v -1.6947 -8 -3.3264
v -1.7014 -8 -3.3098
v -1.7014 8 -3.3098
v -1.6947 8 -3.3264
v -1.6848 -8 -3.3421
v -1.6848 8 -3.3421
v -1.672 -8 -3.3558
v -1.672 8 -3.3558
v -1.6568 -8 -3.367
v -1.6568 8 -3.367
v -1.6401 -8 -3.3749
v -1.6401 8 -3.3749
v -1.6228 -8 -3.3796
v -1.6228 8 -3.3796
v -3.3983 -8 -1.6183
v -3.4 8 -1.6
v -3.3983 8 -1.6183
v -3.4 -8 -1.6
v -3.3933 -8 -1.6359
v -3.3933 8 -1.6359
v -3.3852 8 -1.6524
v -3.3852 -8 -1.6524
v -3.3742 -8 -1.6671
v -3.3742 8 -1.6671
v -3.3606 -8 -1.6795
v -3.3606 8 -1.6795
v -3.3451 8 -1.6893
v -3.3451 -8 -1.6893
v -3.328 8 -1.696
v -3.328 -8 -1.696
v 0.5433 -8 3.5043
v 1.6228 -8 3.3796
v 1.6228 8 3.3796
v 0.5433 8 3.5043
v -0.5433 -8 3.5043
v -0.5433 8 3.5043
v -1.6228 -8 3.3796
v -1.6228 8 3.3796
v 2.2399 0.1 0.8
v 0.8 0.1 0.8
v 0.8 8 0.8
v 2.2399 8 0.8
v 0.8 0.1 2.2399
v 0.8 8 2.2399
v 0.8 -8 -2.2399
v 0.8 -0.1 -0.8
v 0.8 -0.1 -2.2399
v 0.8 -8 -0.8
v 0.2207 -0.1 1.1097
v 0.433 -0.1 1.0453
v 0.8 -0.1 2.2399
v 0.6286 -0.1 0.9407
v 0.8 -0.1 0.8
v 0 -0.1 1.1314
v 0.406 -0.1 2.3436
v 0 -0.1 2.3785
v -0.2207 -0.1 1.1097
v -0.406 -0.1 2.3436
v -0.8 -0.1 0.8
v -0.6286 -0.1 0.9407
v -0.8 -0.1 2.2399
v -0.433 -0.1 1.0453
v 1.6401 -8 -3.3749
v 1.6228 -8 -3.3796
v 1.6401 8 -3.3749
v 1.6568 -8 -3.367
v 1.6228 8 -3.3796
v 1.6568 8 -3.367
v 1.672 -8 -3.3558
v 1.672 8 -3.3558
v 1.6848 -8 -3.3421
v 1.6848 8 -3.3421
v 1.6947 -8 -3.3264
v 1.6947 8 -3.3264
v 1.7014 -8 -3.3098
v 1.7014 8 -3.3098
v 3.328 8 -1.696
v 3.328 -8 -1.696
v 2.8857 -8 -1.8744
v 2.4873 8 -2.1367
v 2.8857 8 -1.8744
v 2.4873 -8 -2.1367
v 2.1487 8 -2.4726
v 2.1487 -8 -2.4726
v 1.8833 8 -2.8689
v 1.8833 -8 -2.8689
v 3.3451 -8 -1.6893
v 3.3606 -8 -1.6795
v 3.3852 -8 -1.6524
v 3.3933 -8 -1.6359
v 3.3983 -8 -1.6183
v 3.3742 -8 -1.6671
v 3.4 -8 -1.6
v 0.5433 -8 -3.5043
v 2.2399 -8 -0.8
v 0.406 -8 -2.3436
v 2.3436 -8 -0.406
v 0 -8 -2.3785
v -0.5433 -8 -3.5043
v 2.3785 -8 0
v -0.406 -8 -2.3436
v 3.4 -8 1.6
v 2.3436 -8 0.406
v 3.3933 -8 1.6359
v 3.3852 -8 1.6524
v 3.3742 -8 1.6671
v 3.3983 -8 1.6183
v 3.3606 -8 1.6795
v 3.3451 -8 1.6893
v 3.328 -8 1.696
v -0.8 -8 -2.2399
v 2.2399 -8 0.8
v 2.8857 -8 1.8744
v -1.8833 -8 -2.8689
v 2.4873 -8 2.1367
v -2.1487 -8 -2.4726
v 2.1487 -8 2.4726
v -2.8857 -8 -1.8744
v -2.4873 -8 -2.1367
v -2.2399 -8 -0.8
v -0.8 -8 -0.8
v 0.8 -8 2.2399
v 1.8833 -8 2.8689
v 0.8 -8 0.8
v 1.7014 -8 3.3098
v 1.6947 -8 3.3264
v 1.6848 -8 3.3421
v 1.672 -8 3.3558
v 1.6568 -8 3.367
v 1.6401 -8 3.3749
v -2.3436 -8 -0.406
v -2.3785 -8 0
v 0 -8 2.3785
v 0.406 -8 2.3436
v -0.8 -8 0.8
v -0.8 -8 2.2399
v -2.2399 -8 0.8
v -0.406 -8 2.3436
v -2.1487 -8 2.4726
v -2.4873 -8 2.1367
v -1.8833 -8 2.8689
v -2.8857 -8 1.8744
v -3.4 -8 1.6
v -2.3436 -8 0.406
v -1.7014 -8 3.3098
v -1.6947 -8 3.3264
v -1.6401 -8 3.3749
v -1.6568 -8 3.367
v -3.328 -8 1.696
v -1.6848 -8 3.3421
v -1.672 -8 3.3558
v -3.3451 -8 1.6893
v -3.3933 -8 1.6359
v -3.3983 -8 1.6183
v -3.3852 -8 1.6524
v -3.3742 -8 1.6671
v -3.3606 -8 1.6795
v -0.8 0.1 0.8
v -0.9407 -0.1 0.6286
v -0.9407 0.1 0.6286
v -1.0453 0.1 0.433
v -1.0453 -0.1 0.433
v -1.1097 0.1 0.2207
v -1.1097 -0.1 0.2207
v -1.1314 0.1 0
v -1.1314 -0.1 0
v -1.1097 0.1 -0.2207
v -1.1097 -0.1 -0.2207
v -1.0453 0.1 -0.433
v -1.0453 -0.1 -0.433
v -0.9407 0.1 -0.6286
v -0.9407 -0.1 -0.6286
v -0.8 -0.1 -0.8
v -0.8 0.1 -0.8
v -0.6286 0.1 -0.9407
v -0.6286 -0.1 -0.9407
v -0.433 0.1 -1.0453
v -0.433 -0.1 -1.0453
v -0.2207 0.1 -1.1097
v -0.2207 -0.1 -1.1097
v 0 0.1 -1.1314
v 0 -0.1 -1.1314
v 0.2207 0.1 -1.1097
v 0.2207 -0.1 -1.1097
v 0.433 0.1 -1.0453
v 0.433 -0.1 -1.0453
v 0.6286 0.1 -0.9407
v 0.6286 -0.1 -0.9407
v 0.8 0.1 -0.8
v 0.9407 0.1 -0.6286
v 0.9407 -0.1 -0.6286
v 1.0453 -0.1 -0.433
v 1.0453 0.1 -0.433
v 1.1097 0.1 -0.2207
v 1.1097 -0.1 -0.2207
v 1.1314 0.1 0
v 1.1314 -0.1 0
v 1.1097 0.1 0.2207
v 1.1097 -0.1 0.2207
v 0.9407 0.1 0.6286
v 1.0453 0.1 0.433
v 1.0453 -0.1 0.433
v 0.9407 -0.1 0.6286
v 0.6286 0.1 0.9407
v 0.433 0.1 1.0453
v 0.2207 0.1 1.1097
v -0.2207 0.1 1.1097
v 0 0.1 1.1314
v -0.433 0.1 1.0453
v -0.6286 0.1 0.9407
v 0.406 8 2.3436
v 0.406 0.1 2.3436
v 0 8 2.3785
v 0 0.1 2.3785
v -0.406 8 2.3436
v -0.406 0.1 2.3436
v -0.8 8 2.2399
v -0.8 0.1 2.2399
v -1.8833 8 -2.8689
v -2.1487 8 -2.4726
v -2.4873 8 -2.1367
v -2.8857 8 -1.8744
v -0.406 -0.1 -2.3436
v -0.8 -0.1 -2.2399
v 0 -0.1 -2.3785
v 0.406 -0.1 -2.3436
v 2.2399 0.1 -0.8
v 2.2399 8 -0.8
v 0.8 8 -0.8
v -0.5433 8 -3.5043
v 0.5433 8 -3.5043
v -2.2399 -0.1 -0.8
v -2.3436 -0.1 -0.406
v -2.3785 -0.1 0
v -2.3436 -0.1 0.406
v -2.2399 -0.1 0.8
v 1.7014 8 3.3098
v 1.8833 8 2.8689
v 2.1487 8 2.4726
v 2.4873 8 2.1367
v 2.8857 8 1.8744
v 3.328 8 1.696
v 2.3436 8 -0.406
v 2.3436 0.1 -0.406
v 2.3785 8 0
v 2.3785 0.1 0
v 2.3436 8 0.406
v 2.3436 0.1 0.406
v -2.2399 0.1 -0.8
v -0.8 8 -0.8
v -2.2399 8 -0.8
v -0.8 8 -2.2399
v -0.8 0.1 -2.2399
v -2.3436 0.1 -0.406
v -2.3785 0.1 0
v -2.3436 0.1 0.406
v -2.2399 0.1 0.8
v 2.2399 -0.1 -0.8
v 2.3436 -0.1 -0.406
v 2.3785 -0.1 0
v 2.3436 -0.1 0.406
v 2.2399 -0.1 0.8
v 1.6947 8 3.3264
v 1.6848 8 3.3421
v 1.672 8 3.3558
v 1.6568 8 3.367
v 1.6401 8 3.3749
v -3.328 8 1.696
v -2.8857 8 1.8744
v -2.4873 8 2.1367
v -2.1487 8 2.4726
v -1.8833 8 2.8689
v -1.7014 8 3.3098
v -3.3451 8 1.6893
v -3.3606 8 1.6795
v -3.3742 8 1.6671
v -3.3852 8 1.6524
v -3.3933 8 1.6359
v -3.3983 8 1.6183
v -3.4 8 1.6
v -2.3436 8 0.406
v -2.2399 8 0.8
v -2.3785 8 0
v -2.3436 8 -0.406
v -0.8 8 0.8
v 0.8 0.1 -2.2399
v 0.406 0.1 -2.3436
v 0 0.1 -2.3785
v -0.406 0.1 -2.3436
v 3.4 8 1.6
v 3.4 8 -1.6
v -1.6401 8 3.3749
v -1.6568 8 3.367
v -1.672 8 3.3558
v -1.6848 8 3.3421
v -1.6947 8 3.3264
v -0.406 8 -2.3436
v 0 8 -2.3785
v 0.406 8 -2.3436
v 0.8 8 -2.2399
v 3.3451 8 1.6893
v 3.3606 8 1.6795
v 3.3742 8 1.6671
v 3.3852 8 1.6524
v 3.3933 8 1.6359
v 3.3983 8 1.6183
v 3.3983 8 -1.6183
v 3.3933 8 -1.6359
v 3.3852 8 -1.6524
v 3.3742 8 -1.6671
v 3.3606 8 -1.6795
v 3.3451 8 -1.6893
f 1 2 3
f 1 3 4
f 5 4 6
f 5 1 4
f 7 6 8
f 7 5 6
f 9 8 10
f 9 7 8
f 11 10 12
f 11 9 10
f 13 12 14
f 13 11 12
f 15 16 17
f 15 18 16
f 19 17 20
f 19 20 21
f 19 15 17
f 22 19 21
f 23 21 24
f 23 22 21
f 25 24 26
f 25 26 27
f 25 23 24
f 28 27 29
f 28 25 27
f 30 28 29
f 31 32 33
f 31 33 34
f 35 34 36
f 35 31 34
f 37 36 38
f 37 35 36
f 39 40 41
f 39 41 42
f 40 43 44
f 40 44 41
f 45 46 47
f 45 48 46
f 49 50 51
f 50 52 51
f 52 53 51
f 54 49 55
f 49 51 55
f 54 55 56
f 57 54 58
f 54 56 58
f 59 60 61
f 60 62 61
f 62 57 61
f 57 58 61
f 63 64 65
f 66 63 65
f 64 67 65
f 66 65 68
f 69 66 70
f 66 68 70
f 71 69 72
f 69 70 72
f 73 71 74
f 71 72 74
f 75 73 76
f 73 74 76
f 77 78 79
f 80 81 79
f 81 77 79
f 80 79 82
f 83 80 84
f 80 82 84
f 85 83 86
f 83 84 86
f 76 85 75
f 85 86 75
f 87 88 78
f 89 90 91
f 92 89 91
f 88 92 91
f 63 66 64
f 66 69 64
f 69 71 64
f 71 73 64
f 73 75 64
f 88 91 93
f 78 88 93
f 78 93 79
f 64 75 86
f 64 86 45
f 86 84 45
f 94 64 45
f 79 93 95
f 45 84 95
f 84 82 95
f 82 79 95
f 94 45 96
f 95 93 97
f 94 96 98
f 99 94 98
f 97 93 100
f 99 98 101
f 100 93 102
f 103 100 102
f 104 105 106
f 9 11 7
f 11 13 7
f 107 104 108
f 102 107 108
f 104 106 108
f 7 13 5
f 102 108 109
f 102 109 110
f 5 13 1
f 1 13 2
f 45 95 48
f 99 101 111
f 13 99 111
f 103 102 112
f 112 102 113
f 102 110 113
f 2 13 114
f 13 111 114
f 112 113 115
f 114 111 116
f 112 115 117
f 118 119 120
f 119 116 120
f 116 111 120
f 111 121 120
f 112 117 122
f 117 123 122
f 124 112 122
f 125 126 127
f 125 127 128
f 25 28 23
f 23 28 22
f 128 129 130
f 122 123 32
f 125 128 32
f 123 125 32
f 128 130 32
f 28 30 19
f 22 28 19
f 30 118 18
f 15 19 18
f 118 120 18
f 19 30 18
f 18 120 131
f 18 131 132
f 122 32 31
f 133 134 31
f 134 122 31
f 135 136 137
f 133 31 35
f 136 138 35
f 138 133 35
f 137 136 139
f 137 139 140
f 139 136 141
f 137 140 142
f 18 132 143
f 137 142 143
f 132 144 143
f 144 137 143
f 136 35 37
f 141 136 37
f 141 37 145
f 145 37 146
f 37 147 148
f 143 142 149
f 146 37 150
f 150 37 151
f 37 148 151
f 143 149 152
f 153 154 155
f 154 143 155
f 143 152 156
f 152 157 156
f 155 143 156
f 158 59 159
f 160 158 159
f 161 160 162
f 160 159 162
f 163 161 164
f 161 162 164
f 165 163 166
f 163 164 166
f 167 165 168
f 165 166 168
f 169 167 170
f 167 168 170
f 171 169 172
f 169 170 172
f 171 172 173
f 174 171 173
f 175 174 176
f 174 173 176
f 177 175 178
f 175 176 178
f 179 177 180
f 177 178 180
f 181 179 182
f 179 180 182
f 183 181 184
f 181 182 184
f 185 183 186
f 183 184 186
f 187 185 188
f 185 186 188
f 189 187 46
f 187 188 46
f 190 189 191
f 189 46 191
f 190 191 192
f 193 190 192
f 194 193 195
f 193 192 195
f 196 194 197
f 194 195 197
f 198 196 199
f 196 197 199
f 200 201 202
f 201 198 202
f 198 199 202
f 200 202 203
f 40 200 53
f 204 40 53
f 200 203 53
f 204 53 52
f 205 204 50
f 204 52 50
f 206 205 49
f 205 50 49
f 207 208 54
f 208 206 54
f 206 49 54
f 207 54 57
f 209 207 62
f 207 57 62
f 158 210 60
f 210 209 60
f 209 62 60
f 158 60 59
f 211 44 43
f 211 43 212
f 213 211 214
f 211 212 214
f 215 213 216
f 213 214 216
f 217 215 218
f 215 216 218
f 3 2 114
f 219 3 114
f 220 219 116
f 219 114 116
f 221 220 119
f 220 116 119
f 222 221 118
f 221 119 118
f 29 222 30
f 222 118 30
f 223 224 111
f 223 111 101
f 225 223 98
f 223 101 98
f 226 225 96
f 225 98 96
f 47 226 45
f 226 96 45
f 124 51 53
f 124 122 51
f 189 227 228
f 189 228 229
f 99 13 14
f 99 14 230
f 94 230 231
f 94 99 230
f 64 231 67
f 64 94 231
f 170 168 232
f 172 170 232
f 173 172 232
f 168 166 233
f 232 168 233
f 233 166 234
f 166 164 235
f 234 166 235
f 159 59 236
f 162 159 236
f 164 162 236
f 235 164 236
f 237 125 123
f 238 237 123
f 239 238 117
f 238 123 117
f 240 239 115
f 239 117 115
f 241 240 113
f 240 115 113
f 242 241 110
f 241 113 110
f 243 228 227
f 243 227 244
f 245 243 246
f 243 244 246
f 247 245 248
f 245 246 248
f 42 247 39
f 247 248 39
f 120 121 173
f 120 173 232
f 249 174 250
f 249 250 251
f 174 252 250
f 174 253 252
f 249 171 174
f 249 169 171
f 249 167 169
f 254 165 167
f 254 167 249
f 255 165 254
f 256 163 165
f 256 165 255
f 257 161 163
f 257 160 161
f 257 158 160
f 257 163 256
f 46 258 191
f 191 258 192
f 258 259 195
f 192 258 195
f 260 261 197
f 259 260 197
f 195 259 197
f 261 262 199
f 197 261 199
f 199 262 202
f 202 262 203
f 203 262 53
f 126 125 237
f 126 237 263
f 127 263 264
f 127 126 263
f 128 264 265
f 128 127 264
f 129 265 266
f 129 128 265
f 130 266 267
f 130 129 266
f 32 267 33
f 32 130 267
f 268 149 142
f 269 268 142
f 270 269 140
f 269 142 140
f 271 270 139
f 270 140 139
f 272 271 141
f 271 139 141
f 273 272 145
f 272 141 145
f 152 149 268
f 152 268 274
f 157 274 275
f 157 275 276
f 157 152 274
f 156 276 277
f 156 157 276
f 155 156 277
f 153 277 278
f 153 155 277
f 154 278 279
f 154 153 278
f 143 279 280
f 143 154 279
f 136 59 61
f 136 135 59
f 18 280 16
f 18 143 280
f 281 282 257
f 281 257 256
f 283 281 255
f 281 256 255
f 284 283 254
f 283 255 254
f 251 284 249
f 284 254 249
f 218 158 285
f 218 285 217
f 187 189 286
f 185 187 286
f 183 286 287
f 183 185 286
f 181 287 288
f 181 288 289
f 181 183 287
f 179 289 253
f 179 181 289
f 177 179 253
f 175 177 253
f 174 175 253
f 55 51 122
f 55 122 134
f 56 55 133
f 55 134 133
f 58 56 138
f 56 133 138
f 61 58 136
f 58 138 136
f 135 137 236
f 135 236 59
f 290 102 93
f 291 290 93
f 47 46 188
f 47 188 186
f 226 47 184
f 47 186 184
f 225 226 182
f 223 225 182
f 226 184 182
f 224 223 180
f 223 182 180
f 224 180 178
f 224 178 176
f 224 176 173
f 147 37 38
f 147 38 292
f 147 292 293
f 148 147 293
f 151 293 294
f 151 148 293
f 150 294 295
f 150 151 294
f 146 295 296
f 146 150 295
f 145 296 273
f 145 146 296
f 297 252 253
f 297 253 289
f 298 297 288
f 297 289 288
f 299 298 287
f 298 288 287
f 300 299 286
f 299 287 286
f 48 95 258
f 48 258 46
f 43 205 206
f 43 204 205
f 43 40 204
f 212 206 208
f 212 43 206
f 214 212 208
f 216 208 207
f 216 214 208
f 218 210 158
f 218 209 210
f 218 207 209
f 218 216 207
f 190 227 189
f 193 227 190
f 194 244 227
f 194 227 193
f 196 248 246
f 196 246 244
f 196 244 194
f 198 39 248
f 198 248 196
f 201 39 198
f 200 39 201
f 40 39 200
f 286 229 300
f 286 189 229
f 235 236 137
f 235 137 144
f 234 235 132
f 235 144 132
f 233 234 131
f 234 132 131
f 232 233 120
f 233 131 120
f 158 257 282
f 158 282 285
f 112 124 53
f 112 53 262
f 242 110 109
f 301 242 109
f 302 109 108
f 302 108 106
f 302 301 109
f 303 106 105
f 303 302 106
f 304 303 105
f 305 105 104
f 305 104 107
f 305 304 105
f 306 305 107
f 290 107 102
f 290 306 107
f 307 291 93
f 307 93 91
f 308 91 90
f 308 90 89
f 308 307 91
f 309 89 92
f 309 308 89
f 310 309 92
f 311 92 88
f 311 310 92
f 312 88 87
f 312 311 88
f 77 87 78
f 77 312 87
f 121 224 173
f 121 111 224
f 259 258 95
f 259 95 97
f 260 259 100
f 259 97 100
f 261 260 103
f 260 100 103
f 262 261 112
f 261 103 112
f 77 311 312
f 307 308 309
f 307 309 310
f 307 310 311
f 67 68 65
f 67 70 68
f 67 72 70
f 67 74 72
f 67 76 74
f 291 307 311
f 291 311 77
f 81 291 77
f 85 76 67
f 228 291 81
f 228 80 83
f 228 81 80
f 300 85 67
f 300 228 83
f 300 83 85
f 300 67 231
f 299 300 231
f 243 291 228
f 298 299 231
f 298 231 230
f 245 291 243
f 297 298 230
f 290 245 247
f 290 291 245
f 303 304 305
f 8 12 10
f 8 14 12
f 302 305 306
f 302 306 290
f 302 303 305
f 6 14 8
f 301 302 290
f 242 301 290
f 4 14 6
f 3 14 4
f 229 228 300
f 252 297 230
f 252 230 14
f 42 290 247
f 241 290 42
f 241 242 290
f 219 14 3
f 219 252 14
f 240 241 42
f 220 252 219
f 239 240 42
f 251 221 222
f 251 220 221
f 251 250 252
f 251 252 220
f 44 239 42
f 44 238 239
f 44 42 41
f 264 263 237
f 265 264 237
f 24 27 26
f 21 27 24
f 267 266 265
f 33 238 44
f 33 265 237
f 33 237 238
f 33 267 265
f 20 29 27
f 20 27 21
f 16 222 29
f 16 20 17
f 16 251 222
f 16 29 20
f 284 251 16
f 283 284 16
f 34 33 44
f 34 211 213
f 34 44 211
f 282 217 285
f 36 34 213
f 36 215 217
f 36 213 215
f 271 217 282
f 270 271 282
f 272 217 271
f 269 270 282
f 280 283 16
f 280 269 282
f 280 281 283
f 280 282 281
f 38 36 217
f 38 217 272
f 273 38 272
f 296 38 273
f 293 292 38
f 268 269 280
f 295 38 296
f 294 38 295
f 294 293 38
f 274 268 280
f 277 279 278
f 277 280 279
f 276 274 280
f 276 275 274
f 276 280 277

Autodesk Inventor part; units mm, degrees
ref_plane "YZ Plane" through (0, 0, 0) normal (1, 0, 0) x (0, 1, 0)
ref_plane "XZ Plane" through (0, 0, 0) normal (0, 1, 0) x (-1, 0, 0)
ref_plane "XY Plane" through (0, 0, 0) normal (0, 0, 1) x (1, 0, 0)
sketch "Sketch2" plane through (0, 0, 0) normal (0, 1, 0) x (-1, 0, 0)
  circle A0 centre (0, 0) radius 3.52 construction
  circle A1 centre (0, 0) radius 2.3784 construction
  line L0 (-4, 4) -> (4, 4) construction
  line L1 (4, 4) -> (4, -4) construction
  line L2 (-0.8, 2.2399) -> (-0.8, 0.8)
  line L3 (-0.8, 0.8) -> (-2.2399, 0.8)
  line L4 (-2.2399, -0.8) -> (-0.8, -0.8)
  line L5 (-0.8, -0.8) -> (-0.8, -2.2399)
  line L6 (0.8, -2.2399) -> (0.8, -0.8)
  line L7 (0.8, -0.8) -> (2.2399, -0.8)
  line L8 (2.2399, 0.8) -> (0.8, 0.8)
  line L9 (0.8, 0.8) -> (0.8, 2.2399)
  arc A2 (0.8, 2.2399) -> (-0.8, 2.2399) centre (0, 0) ccw
  arc A3 (-2.2399, 0.8) -> (-2.2399, -0.8) centre (0, 0) ccw
  arc A4 (-0.8, -2.2399) -> (0.8, -2.2399) centre (0, 0) ccw
  arc A5 (2.2399, -0.8) -> (2.2399, 0.8) centre (0, 0) ccw
  circle A6 centre (-4, 4) radius 2.4
  circle A7 centre (4, 4) radius 2.4
  circle A8 centre (-4, -4) radius 2.4
  circle A9 centre (4, -4) radius 2.4
  arc A10 (1.6845, 3.3686) -> (-1.6845, 3.3686) centre (0, -5.93) ccw
  line L10 (-3.4, 1.6762) -> (-3.4, -1.6762)
  line L11 (3.4, 1.6762) -> (3.4, -1.6762)
  arc A11 (-1.6845, -3.3686) -> (1.6845, -3.3686) centre (0, 5.93) ccw
  circle A12 centre (0, 0) radius 1.1314
  point P0 (0, 4)
  point P1 (4, 0)
  dimension "d0" = 4.7569
  dimension "d1" = 7.04
  dimension "d2" = 8
  dimension "d4" = 1.6
  dimension "d20" = 4.8
  dimension "d21" = 18.9
  dimension "d22" = 6.8
extrude "Extrusion1" add sketch "Sketch2" along normal mid plane 16 contours A6 A10 A7 L11 A9 A11 A8 L10
extrude "Extrusion3" add sketch "Sketch2" along normal mid plane 0.2 contours A2 L9 A12 L2 | A12 L4 A3 L3 | L8 A5 L7 A12 | A12 L6 A4 L5
fillet "Fillet1" radius 0.1 8 edges at (1.6845, 0, 3.3686) (3.4, 0, 1.6762) (-1.6845, 0, 3.3686) (-3.4, 0, 1.6762) (3.4, 0, -1.6762) (1.6845, 0, -3.3686) (-1.6845, 0, -3.3686) (-3.4, 0, -1.6762)
equation "\"d2\" = lu"
equation "\"d4\" = axlet"
equation "\"lu\" = 8"
equation "\"axlet\" = 1.6"
properties part number "6538c-Black" material "ABS Plastic"
